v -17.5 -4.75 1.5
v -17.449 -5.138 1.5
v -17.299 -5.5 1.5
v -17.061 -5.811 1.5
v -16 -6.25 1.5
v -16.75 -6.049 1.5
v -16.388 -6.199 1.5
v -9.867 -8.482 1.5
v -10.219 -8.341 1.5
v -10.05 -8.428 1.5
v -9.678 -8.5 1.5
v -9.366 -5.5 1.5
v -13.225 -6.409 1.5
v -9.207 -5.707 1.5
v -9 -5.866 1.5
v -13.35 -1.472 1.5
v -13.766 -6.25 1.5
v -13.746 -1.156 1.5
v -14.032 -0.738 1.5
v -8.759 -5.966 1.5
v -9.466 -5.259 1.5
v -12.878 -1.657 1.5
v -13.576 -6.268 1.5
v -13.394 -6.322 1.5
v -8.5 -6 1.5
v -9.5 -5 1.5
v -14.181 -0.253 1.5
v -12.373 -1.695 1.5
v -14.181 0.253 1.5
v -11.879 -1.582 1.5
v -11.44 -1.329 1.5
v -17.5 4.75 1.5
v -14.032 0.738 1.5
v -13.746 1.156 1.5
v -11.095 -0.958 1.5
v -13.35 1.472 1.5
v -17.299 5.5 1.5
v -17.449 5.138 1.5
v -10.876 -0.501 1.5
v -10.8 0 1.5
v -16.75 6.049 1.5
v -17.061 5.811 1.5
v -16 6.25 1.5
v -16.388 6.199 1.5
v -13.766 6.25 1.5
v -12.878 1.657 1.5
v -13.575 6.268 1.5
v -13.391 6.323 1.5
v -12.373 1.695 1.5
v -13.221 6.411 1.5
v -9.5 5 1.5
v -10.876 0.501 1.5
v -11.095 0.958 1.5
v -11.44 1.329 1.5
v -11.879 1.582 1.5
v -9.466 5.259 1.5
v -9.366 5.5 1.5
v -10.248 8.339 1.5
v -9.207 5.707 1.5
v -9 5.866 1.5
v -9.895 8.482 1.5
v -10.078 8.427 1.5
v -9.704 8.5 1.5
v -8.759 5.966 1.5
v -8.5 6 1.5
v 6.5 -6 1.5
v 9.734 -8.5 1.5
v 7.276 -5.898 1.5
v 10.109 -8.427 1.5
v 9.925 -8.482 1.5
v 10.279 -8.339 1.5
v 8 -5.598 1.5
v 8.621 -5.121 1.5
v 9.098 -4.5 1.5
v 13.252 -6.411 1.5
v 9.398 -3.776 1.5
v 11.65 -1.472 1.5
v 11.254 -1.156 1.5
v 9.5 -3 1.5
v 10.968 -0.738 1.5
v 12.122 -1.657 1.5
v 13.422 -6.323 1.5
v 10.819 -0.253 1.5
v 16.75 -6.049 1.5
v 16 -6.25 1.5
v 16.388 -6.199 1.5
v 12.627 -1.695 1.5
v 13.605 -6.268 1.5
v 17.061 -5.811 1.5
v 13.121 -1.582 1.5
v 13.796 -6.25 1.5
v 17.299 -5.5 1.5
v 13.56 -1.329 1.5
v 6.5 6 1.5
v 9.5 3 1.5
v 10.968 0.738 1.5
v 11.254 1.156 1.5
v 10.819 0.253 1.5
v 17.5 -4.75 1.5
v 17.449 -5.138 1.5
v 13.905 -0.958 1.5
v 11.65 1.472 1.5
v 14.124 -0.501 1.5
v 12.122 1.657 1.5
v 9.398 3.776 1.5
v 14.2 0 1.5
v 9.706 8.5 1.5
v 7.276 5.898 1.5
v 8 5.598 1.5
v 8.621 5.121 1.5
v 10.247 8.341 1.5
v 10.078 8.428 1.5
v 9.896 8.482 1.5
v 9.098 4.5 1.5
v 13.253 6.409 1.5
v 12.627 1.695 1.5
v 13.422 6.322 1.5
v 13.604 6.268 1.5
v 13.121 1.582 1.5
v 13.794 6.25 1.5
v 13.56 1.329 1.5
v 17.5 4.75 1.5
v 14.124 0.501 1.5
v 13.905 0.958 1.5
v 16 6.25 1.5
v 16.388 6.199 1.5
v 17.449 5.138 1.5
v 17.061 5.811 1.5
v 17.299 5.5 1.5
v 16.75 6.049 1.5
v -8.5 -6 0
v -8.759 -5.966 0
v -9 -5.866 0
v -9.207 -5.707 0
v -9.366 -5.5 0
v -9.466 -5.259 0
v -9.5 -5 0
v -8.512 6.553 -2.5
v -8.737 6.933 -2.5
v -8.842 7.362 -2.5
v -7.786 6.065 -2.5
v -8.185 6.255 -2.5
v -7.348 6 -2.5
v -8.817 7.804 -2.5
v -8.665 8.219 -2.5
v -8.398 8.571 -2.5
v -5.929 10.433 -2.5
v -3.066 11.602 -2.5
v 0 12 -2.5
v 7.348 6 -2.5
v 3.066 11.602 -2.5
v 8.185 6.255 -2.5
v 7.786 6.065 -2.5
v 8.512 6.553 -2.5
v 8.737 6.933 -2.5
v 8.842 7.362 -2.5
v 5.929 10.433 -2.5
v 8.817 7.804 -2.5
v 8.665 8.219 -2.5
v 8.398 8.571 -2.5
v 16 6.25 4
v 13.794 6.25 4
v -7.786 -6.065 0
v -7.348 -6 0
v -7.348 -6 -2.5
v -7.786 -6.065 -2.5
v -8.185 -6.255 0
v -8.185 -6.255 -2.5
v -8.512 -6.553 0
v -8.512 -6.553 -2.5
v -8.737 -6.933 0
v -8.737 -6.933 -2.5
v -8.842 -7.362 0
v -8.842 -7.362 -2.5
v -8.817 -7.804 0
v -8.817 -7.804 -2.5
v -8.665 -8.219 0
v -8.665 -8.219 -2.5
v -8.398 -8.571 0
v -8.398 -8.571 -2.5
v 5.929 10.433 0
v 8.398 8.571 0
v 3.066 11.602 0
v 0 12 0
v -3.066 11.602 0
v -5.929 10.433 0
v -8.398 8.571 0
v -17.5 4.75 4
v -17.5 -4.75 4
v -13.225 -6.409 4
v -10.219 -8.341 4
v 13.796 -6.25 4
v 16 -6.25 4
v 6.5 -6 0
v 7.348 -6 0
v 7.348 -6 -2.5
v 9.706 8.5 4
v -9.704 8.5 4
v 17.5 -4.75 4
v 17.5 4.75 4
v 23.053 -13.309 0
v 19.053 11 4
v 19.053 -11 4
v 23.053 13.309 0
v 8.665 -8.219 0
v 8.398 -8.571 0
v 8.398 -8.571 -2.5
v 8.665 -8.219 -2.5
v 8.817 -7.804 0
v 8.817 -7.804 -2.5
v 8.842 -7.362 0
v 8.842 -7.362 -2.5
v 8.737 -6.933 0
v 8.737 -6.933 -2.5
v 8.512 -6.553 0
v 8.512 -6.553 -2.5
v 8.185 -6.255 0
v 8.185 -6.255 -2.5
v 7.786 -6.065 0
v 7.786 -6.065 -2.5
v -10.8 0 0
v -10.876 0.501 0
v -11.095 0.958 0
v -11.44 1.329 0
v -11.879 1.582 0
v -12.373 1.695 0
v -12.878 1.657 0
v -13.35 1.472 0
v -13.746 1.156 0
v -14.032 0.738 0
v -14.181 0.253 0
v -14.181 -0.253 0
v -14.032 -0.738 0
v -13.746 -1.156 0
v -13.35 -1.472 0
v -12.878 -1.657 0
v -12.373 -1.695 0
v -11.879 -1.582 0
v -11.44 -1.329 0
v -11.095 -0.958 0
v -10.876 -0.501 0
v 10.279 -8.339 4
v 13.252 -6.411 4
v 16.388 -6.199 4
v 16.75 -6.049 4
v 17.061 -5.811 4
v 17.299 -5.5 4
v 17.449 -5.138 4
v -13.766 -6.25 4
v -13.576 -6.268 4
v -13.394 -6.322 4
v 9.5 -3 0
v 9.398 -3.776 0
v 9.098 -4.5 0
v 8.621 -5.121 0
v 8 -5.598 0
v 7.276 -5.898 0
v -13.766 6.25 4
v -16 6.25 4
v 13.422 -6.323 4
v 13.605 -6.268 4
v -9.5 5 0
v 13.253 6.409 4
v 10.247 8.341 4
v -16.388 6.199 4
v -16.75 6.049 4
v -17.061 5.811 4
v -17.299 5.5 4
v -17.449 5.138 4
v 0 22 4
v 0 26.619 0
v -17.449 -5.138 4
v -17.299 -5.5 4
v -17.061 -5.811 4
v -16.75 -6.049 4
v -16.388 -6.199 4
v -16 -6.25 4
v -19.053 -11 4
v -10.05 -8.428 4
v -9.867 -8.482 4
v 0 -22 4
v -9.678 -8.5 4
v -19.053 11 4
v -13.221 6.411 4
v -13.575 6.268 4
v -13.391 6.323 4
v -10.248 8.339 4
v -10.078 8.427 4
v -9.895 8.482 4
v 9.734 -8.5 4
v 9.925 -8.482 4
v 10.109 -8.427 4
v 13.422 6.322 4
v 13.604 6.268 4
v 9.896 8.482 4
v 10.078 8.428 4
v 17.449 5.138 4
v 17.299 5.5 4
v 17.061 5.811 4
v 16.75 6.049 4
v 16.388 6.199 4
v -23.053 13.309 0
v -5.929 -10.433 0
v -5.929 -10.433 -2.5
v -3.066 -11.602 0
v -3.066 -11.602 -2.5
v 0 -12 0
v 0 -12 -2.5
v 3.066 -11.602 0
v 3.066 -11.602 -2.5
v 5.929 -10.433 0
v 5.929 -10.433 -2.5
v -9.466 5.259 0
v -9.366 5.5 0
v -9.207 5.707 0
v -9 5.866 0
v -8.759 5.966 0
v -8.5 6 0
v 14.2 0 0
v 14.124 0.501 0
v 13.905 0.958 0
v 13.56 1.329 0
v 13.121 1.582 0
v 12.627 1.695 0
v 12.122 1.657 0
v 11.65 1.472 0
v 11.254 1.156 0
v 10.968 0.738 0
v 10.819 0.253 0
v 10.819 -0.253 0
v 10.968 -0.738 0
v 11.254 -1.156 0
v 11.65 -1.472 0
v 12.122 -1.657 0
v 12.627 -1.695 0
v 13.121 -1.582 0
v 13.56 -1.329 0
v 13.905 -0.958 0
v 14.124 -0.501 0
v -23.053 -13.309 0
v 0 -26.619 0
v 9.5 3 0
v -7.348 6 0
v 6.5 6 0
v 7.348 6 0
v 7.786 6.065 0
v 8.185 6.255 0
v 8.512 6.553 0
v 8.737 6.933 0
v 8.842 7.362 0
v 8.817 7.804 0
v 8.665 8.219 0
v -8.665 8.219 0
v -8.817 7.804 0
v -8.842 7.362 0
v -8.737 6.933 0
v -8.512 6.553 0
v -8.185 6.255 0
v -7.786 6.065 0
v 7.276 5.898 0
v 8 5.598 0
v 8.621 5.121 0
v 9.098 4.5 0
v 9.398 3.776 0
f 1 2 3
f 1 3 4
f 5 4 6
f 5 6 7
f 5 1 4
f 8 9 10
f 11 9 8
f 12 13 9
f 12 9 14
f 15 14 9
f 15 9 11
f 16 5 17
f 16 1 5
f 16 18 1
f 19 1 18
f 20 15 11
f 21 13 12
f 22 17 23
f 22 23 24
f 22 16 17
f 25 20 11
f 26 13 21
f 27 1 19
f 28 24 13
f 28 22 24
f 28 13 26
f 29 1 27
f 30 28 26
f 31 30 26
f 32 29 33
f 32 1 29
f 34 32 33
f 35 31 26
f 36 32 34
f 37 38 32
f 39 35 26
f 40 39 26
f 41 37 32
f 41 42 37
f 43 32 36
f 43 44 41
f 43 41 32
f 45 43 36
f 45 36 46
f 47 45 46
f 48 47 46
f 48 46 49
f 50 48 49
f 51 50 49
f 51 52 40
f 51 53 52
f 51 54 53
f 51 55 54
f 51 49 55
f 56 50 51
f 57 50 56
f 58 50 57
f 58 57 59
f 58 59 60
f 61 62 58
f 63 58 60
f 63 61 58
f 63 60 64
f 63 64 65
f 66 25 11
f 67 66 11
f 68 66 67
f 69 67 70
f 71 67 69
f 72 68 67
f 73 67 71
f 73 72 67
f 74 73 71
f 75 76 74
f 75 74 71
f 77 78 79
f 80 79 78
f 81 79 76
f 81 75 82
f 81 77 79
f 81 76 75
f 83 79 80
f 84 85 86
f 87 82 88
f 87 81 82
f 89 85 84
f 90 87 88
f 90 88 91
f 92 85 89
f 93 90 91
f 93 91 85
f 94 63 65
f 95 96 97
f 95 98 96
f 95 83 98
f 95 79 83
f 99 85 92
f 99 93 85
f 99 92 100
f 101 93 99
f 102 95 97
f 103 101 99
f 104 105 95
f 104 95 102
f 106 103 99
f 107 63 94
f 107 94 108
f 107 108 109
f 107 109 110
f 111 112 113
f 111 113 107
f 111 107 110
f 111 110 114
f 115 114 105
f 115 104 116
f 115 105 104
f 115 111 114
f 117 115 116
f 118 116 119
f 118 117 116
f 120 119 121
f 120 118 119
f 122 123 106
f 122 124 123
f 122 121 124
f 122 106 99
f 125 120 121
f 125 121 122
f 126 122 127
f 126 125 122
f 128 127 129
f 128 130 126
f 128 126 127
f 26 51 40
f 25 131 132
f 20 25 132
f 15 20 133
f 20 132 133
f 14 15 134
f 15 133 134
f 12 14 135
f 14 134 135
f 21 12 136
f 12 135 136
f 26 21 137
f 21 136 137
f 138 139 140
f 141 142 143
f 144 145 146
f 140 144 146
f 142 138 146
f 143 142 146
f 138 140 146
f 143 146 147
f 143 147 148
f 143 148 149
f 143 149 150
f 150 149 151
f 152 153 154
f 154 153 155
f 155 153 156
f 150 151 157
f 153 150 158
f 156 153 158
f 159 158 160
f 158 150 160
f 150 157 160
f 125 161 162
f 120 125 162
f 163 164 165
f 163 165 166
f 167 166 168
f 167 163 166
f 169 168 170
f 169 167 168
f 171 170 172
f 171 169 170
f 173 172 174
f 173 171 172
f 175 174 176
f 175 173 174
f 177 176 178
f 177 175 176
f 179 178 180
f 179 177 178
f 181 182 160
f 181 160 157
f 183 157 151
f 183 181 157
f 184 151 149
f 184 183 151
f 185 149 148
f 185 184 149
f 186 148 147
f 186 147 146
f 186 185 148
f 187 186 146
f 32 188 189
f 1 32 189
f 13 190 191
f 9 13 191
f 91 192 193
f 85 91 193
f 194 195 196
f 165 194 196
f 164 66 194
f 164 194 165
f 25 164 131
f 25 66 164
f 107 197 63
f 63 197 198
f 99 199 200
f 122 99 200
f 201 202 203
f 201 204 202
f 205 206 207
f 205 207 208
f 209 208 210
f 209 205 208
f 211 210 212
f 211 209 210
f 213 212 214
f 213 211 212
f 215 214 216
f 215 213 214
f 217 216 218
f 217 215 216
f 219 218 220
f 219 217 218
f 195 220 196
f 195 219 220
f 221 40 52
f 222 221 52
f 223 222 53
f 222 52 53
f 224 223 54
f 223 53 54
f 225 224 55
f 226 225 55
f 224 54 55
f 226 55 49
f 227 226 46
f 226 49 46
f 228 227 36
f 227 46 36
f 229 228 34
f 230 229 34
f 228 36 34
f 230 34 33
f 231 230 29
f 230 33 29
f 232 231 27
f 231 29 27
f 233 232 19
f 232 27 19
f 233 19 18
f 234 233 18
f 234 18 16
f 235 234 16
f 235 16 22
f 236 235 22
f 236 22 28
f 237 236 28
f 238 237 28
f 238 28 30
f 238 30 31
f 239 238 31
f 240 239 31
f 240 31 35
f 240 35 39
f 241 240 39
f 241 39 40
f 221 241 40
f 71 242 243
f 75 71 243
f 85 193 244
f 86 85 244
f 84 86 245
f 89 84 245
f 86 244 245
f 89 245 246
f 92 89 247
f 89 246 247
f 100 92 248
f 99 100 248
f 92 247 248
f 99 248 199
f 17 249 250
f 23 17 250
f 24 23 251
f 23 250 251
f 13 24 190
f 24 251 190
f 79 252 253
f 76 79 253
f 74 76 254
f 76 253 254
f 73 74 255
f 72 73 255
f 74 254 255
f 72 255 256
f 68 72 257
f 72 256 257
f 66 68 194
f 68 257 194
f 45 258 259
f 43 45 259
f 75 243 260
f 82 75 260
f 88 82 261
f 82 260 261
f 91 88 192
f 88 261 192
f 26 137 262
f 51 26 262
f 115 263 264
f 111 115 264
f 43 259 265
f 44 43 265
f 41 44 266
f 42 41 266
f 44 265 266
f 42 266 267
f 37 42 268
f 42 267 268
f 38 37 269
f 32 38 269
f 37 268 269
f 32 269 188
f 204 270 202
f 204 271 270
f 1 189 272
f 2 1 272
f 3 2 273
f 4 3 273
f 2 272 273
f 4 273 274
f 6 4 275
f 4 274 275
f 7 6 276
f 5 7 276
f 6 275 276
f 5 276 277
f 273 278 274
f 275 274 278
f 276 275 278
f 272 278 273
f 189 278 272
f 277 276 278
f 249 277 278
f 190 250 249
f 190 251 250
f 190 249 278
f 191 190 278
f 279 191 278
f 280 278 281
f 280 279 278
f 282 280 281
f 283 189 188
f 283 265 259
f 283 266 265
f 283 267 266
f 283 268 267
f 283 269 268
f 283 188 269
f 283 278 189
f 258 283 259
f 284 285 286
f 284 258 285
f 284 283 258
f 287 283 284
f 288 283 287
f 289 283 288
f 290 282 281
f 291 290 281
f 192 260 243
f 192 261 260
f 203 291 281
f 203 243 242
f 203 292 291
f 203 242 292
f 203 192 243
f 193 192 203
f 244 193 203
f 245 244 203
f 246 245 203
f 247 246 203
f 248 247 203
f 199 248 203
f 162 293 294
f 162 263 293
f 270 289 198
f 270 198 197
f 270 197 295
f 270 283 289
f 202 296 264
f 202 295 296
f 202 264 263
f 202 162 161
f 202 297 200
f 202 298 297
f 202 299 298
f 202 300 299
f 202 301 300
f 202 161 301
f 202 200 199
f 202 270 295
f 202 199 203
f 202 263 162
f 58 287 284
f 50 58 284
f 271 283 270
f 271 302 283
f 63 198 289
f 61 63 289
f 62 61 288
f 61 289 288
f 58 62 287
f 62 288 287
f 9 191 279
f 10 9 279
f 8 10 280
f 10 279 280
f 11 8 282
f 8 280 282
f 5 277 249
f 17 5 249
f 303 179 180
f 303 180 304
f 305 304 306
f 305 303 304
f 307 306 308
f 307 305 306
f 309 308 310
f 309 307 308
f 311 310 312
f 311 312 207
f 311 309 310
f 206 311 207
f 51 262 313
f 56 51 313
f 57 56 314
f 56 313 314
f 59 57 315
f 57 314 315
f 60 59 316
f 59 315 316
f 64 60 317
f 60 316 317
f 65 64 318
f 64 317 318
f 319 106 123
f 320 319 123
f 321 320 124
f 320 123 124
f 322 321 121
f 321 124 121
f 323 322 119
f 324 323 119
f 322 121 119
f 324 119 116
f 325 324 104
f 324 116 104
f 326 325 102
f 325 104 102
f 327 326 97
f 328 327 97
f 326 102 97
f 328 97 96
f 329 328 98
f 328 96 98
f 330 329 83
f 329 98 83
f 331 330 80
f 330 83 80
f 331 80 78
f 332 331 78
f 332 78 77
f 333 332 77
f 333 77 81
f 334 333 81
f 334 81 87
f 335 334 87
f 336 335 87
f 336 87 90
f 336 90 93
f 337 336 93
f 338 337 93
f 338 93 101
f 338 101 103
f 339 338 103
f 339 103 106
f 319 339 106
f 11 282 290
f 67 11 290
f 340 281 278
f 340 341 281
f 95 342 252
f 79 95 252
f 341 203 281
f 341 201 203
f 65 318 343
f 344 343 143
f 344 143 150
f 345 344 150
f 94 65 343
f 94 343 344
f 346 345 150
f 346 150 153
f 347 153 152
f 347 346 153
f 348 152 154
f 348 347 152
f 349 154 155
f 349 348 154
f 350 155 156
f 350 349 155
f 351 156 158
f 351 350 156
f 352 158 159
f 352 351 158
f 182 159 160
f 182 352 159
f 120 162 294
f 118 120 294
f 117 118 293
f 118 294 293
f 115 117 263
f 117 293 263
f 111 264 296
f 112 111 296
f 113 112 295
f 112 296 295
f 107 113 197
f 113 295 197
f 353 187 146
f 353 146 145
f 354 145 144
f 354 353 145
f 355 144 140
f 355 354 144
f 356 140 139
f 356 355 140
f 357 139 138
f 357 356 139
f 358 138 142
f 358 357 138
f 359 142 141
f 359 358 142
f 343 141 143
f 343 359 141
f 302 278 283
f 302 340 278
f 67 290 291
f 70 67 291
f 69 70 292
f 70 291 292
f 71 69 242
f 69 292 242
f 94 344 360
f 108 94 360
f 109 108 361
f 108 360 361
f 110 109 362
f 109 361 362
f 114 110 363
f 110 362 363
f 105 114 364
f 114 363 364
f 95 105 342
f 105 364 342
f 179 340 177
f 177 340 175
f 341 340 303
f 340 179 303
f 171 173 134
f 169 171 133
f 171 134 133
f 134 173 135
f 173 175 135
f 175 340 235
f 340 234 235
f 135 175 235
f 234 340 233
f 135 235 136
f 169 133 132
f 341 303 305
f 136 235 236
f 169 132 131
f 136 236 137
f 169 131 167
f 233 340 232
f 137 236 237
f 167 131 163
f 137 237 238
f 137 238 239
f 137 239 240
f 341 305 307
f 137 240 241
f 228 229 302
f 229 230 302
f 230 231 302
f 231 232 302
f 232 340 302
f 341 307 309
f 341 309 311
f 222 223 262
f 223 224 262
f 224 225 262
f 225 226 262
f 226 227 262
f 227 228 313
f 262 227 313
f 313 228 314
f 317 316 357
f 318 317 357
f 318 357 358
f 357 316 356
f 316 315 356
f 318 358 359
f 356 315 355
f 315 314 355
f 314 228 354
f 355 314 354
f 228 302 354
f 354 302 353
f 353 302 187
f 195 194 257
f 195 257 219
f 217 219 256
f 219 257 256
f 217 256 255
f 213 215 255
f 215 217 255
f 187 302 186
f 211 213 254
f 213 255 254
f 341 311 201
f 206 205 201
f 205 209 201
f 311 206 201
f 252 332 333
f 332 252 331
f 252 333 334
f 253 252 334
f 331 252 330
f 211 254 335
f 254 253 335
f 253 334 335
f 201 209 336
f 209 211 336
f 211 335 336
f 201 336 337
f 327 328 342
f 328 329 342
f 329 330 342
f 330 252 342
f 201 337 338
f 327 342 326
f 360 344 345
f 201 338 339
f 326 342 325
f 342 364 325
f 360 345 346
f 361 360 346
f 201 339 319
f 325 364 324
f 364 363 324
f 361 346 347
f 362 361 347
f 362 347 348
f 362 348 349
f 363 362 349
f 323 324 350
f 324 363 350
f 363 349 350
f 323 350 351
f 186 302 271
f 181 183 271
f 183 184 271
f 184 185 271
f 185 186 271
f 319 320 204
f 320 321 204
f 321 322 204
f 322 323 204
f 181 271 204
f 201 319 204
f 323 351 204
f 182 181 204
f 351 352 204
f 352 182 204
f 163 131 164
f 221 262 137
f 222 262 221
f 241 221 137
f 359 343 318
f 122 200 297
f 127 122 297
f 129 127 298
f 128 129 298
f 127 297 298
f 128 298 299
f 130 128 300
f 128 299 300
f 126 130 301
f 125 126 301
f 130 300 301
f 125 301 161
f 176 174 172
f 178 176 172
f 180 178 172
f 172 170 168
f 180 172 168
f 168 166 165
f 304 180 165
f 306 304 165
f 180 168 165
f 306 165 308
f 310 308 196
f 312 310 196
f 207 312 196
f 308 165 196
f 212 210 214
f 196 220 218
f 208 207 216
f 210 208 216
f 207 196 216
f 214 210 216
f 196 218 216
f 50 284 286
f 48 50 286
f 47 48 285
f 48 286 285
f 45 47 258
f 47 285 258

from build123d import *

# Parameters (mm, degrees)
SKETCH1_R           = 28
BOSS_EXTRUDE1_DEPTH = 4
BOSS_EXTRUDE2_DEPTH = 2.5
CUT_EXTRUDE1_DEPTH  = 2.5
CUT_EXTRUDE2_DEPTH  = 7.5
SKETCH5_R           = 1.7
CUT_EXTRUDE3_DEPTH  = 5
SKETCH7_OUTSIDE_W   = 88.892
SKETCH7_OUTSIDE_H   = 88.892
CUT_EXTRUDE4_DEPTH  = 7.5
CUT_EXTRUDE4_TAPER  = 45


with BuildPart() as part:
    # Sketch1 → Boss-Extrude1 (new body)
    with BuildSketch(Plane.XY):
        Circle(SKETCH1_R)
    extrude(amount=BOSS_EXTRUDE1_DEPTH)

    # Sketch2 → Boss-Extrude2 (add)
    with BuildSketch(Plane(origin=(0, 0, 0), x_dir=(-1, 0, 0), z_dir=(0, 0, -1))):
        with BuildLine():
            Line((-7.348469228, -6), (7.348469228, -6))
            ThreePointArc((7.348469228, -6), (8.737199378, -6.93305329), (8.398250547, -8.571428571))
            ThreePointArc((8.398250547, -8.571428571), (0, -12), (-8.398250547, -8.571428571))
            ThreePointArc((-8.398250547, -8.571428571), (-8.737199378, -6.93305329), (-7.348469228, -6))
        make_face()
        with BuildLine():
            Line((7.348469228, 6), (-7.348469228, 6))
            ThreePointArc((-7.348469228, 6), (-8.737199378, 6.93305329), (-8.398250547, 8.571428571))
            ThreePointArc((-8.398250547, 8.571428571), (0, 12), (8.398250547, 8.571428571))
            ThreePointArc((8.398250547, 8.571428571), (8.737199378, 6.93305329), (7.348469228, 6))
        make_face()
    extrude(amount=BOSS_EXTRUDE2_DEPTH)

    # Sketch3 → Cut-Extrude1 (cut)
    with BuildSketch(Plane.XY.offset(4)):
        with BuildLine():
            Line((-17.5, 4.75), (-17.5, -4.75))
            ThreePointArc((-17.5, -4.75), (-17.060660172, -5.810660172), (-16, -6.25))
            Line((-16, -6.25), (-13.765564437, -6.25))
            ThreePointArc((-13.765564437, -6.25), (-13.483765285, -6.290526583), (-13.224806846, -6.408821525))
            Line((-13.224806846, -6.408821525), (-10.218918256, -8.341178475))
            ThreePointArc((-10.218918256, -8.341178475), (-9.959959817, -8.459473417), (-9.678160664, -8.5))
            Line((-9.678160664, -8.5), (9.734435563, -8.5))
            ThreePointArc((9.734435563, -8.5), (10.018134319, -8.458913456), (10.278520672, -8.339030031))
            Line((10.278520672, -8.339030031), (13.251769281, -6.410969969))
            ThreePointArc((13.251769281, -6.410969969), (13.512155635, -6.291086544), (13.795854391, -6.25))
            Line((13.795854391, -6.25), (16, -6.25))
            ThreePointArc((16, -6.25), (17.060660172, -5.810660172), (17.5, -4.75))
            Line((17.5, -4.75), (17.5, 4.75))
            ThreePointArc((17.5, 4.75), (17.060660172, 5.810660172), (16, 6.25))
            Line((16, 6.25), (13.793701886, 6.25))
            ThreePointArc((13.793701886, 6.25), (13.511902734, 6.290526583), (13.252944295, 6.408821525))
            Line((13.252944295, 6.408821525), (10.247055705, 8.341178475))
            ThreePointArc((10.247055705, 8.341178475), (9.988097266, 8.459473417), (9.706298114, 8.5))
            Line((9.706298114, 8.5), (-9.704145609, 8.5))
            ThreePointArc((-9.704145609, 8.5), (-9.987844365, 8.458913456), (-10.248230719, 8.339030031))
            Line((-10.248230719, 8.339030031), (-13.221479328, 6.410969969))
            ThreePointArc((-13.221479328, 6.410969969), (-13.481865681, 6.291086544), (-13.765564437, 6.25))
            Line((-13.765564437, 6.25), (-16, 6.25))
            ThreePointArc((-16, 6.25), (-17.060660172, 5.810660172), (-17.5, 4.75))
        make_face()
    extrude(amount=-CUT_EXTRUDE1_DEPTH, mode=Mode.SUBTRACT)

    # Sketch4 → Cut-Extrude2 (cut, through all)
    with BuildSketch(Plane(origin=(0, 0, -2.5), x_dir=(-1, 0, 0), z_dir=(0, 0, -1))):
        with BuildLine():
            Line((-6.5, -6), (8.5, -6))
            ThreePointArc((8.5, -6), (9.207106781, -5.707106781), (9.5, -5))
            Line((9.5, -5), (9.5, 5))
            ThreePointArc((9.5, 5), (9.207106781, 5.707106781), (8.5, 6))
            Line((8.5, 6), (-6.5, 6))
            ThreePointArc((-6.5, 6), (-8.621320344, 5.121320344), (-9.5, 3))
            Line((-9.5, 3), (-9.5, -3))
            ThreePointArc((-9.5, -3), (-8.621320344, -5.121320344), (-6.5, -6))
        make_face()
    extrude(amount=-CUT_EXTRUDE2_DEPTH, mode=Mode.SUBTRACT)

    # Sketch5 → Cut-Extrude3 (cut, through all)
    with BuildSketch(Plane.XY.offset(1.5)):
        with Locations((-12.5, 0)):
            Circle(SKETCH5_R)
        with Locations((12.5, 0)):
            Circle(SKETCH5_R)
    extrude(amount=-CUT_EXTRUDE3_DEPTH, mode=Mode.SUBTRACT)

    # Sketch7 outside → Cut-Extrude4 (cut, through all)
    with BuildSketch(Plane.XY.offset(4)):
        Rectangle(SKETCH7_OUTSIDE_W, SKETCH7_OUTSIDE_H)
        Polygon((0, 22), (-19.052558883, 11), (-19.052558883, -11), (0, -22), (19.052558883, -11), (19.052558883, 11), align=None, mode=Mode.SUBTRACT)
    extrude(amount=-CUT_EXTRUDE4_DEPTH, taper=CUT_EXTRUDE4_TAPER, mode=Mode.SUBTRACT)


solid = part.part
